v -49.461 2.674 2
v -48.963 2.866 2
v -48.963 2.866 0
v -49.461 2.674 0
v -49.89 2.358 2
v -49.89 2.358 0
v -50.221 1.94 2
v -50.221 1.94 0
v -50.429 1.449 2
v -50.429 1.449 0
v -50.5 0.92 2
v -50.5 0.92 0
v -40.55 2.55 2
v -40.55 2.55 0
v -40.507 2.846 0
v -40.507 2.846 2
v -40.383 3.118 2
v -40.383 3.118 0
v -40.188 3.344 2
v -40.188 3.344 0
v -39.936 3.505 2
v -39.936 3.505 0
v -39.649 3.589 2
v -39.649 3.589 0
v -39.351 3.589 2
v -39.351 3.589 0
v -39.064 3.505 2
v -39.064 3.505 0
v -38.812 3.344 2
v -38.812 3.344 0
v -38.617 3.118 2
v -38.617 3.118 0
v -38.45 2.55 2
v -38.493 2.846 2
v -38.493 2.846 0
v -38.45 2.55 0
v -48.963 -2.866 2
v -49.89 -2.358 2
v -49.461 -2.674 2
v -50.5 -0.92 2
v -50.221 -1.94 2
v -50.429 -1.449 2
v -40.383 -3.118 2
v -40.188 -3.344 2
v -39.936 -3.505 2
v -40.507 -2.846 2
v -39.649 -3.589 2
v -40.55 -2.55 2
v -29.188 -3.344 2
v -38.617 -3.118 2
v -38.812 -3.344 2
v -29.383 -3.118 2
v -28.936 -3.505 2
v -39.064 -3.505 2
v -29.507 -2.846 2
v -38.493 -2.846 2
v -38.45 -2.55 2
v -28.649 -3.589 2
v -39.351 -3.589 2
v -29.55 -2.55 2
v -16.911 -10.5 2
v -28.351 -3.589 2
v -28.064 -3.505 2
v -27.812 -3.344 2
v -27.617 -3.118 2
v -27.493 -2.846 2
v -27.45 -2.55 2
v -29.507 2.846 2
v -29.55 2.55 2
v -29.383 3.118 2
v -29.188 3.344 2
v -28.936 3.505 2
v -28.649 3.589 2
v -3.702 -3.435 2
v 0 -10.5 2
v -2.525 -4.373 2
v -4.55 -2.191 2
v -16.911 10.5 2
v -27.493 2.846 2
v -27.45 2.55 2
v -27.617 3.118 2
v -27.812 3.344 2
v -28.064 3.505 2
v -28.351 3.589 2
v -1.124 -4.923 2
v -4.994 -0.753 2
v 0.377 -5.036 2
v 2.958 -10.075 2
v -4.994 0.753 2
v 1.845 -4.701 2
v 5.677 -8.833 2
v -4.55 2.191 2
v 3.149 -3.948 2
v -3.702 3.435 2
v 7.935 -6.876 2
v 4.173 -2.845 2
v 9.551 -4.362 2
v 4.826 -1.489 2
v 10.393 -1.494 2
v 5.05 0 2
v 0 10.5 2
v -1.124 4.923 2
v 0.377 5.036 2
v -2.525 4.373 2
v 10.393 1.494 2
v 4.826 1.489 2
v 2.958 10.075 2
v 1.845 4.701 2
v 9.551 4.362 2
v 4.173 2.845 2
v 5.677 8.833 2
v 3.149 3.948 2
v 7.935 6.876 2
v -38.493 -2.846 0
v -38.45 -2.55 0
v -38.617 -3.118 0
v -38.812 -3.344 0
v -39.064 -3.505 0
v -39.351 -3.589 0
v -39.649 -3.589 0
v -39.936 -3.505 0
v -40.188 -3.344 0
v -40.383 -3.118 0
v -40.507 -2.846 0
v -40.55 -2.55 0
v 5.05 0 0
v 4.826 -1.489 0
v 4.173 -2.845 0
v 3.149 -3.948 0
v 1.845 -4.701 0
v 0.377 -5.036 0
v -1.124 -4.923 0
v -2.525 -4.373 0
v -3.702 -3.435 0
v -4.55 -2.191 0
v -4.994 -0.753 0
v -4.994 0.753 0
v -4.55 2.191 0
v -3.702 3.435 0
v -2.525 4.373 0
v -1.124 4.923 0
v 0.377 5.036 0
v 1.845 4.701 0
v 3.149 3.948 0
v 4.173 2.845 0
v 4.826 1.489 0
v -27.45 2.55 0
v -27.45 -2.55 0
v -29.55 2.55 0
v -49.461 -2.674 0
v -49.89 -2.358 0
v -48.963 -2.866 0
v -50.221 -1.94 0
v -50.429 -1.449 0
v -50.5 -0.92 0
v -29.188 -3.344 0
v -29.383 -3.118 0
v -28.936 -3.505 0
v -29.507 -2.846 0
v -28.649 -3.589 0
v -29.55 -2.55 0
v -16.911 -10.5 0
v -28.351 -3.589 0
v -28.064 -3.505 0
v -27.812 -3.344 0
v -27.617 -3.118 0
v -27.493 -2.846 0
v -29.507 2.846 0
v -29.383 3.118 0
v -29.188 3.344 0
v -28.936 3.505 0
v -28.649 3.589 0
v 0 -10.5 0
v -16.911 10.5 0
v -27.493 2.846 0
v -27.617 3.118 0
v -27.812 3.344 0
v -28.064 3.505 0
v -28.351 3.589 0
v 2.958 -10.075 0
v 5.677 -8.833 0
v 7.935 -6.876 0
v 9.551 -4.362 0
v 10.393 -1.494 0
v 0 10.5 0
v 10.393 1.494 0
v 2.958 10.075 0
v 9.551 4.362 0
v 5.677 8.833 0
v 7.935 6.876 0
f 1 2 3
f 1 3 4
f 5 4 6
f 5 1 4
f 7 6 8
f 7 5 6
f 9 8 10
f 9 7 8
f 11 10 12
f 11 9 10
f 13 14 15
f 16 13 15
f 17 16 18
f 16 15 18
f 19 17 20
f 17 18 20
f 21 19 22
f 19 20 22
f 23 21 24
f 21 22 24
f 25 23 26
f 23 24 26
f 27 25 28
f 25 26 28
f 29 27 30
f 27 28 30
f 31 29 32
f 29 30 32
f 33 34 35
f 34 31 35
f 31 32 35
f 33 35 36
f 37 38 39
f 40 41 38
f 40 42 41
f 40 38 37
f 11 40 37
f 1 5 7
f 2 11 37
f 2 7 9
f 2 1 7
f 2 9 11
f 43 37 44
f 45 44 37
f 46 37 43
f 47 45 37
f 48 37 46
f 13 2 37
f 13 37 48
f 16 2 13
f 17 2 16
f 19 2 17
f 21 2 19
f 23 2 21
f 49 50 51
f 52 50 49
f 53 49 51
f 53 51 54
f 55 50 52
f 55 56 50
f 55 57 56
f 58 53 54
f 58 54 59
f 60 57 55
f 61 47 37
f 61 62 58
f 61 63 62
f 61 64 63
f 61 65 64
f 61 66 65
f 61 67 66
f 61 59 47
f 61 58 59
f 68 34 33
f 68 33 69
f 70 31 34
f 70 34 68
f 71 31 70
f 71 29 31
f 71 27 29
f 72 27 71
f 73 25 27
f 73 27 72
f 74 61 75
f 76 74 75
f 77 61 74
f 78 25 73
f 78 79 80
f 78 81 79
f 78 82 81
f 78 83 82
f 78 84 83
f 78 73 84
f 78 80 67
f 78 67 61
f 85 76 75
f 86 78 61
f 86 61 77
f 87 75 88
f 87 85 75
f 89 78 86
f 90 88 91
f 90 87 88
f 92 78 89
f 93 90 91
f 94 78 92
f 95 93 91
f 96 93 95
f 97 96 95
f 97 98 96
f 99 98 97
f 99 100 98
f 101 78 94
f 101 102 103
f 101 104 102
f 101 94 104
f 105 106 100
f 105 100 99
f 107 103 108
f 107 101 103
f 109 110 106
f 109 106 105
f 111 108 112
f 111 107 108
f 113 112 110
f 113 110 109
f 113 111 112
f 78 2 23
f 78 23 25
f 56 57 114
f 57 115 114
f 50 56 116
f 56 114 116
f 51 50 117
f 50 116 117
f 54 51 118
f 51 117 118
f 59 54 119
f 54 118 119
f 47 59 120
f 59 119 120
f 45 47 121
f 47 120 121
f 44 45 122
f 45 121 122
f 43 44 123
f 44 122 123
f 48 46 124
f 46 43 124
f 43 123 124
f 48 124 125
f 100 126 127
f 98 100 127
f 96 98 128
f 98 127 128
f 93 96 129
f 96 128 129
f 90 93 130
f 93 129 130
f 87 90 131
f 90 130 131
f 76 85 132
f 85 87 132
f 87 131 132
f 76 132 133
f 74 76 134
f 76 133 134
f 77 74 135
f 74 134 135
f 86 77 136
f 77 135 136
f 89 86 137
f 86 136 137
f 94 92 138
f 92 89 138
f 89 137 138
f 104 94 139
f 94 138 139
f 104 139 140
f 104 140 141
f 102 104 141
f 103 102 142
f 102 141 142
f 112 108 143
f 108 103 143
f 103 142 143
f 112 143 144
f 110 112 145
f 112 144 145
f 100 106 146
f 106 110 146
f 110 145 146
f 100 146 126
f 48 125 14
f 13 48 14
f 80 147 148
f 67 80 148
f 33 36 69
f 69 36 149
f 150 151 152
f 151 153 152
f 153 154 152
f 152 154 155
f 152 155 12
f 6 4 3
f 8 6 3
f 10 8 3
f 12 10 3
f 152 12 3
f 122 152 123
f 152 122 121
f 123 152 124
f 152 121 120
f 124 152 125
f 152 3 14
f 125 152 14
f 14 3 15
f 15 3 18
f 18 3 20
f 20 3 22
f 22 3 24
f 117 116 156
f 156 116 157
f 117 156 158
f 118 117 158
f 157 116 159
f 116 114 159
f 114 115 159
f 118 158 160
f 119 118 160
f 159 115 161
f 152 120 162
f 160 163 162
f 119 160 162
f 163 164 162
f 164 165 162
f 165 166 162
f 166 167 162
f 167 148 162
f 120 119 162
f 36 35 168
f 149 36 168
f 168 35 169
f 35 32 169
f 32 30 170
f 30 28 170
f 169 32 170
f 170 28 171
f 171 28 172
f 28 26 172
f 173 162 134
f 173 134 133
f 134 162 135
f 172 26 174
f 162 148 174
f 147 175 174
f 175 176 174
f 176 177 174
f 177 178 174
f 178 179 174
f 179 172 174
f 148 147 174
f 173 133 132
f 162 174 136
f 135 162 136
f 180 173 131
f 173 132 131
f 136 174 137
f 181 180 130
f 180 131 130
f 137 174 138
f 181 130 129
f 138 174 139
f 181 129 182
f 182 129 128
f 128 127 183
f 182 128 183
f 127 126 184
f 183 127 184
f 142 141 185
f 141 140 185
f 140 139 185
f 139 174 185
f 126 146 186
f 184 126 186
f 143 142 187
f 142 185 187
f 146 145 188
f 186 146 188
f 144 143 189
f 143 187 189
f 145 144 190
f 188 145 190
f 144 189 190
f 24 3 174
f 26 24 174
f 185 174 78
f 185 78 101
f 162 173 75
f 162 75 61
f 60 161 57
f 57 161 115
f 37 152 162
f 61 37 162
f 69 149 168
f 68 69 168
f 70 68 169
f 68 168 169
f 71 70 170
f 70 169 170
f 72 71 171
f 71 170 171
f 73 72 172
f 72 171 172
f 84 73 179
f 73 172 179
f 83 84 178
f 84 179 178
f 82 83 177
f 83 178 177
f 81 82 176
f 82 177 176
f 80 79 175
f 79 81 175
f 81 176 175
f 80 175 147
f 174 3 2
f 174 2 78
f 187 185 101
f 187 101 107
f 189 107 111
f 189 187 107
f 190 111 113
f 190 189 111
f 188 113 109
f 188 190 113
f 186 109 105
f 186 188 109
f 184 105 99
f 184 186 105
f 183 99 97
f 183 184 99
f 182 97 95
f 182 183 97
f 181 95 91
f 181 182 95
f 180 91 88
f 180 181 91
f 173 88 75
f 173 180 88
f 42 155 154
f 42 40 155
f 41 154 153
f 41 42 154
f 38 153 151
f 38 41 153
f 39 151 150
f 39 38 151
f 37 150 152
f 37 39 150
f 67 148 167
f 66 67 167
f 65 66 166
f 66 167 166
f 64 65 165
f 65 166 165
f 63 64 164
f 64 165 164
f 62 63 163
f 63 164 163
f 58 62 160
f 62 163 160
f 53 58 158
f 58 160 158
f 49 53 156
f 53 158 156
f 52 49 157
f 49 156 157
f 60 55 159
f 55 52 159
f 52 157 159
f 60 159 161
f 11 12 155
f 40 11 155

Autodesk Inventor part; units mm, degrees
ref_plane "YZ Plane" through (0, 0, 0) normal (1, 0, 0) x (0, 1, 0)
ref_plane "XZ Plane" through (0, 0, 0) normal (0, 1, 0) x (-1, 0, 0)
ref_plane "XY Plane" through (0, 0, 0) normal (0, 0, 1) x (1, 0, 0)
sketch "スケッチ1" plane through (0, 0, 0) normal (0, 0, 1) x (1, 0, 0)
  circle A0 centre (0, 0) radius 10.5 construction
  line L0 (0, 10.5) -> (-162.5, 10.5) construction
  line L1 (-162.5, 10.5) -> (-162.5, -10.5) construction
  line L2 (-162.5, -10.5) -> (0, -10.5) construction
  circle A1 centre (-157.5, 0) radius 1.55 construction
  line L3 (-147.5, 2.5) -> (-32.5, 2.5) construction
  line L4 (-32.5, 2.5) -> (-32.5, -2.5) construction
  line L5 (-32.5, -2.5) -> (-147.5, -2.5) construction
  line L6 (-147.5, -2.5) -> (-147.5, 2.5) construction
  line L7 (-90, 2.5) -> (-90, -2.5) construction
  circle A2 centre (-22.5, 0) radius 1.55 construction
  line L8 (-12, 21.3027) -> (-12, -27.3903) construction
  line L9 (-32.45, 2.55) -> (-147.55, 2.55) construction
  line L10 (-147.55, 2.55) -> (-147.55, -2.55) construction
  line L11 (-147.55, -2.55) -> (-32.45, -2.55) construction
  line L12 (-32.45, -2.55) -> (-32.45, 2.55) construction
  circle A3 centre (-146.5, 2.55) radius 1.05 construction
  line L13 (-147.5, 0) -> (-90, 0) construction
  line L14 (-147.55, 2.55) -> (-147.55, -2.55) construction
  arc A4 (-145.45, 2.55) -> (-147.55, 2.55) centre (-146.5, 2.55) ccw construction
  line L15 (-145.45, 2.55) -> (-34.55, 2.55) construction
  arc A5 (-32.45, 2.55) -> (-34.55, 2.55) centre (-33.5, 2.55) ccw construction
  line L16 (-32.45, 2.55) -> (-32.45, -2.55) construction
  arc A6 (-147.55, -2.55) -> (-145.45, -2.55) centre (-146.5, -2.55) ccw construction
  line L17 (-145.45, -2.55) -> (-34.55, -2.55) construction
  arc A7 (-34.55, -2.55) -> (-32.45, -2.55) centre (-33.5, -2.55) ccw construction
  circle A8 centre (0, 8.5) radius 1.35
  circle A9 centre (0, 0) radius 5.05
  circle A10 centre (-8.5, 0) radius 1.35
  circle A11 centre (0, -8.5) radius 1.35
  circle A12 centre (8.5, 0) radius 1.35
  line L18 (-162.5, 4.8006) -> (-162.5, -4.8006) construction
  line L19 (-162.5, 4.8006) -> (-22.5, 10.5) construction
  line L20 (-22.5, 10.5) -> (0, 10.5) construction
  line L21 (-162.5, -4.8006) -> (-22.5, -10.5) construction
  line L22 (-22.5, -10.5) -> (0, -10.5) construction
  arc A13 (0, -10.5) -> (0, 10.5) centre (0, 0) ccw construction
  circle A14 centre (-157.5, 0) radius 5 construction
  circle A15 centre (-21.5, 0) radius 1.55
  circle A16 centre (-46.5, 0) radius 1.55
  line L23 (-17.5, -2.5) -> (-50.5, -2.5) construction
  line L24 (-50.5, -2.5) -> (-50.5, 2.5) construction
  line L25 (-50.5, 2.5) -> (-17.5, 2.5) construction
  line L26 (-17.5, 2.5) -> (-17.5, -2.5) construction
  line L27 (-27.5, -2.5) -> (-40.5, -2.5) construction
  line L28 (-40.5, -2.5) -> (-40.5, 2.5) construction
  line L29 (-40.5, 2.5) -> (-27.5, 2.5) construction
  line L30 (-27.5, 2.5) -> (-27.5, -2.5) construction
  line L31 (-27.45, -2.55) -> (-40.55, -2.55)
  line L32 (-40.55, -2.55) -> (-40.55, 2.55)
  line L33 (-40.55, 2.55) -> (-27.45, 2.55)
  line L34 (-27.45, 2.55) -> (-27.45, -2.55)
  circle A17 centre (-28.5, -2.55) radius 1.05
  circle A18 centre (-28.5, 2.55) radius 1.05
  circle A19 centre (-39.5, -2.55) radius 1.05
  circle A20 centre (-39.5, 2.55) radius 1.05
  line L35 (-50.5, 2.5) -> (-50.5, -2.5)
  line L36 (-50.5, -2.5) -> (-16.9113, -10.5)
  line L37 (-50.5, 2.5) -> (-16.9113, 10.5)
  arc A21 (0, -10.5) -> (0, 10.5) centre (0, 0) ccw
  line L38 (-16.9113, 10.5) -> (0, 10.5)
  line L39 (0, -10.5) -> (-16.9113, -10.5)
  circle A22 centre (-39.5, 2.55) radius 2.5 construction
  circle A23 centre (0, 0) radius 16 construction
  circle A24 centre (0, 0) radius 21 construction
  line L40 (-21, 19.3585) -> (-21, -28.09) construction
  point P0 (-162.5, 0)
  point P1 (-17.5, 0)
  dimension "d9" = 2.1
  dimension "d29" = 2.1
  dimension "d0" = 162.5
  dimension "d1" = 3.1
  dimension "d2" = 21
  dimension "d3" = 10
  dimension "d4" = 5
  dimension "d5" = 12
  dimension "d6" = 135
  dimension "d7" = 5
  dimension "d8" = 0.05
  dimension "d10" = 2.7
  dimension "d11" = 8.5
  dimension "d12" = 10.1
  dimension "d15" = 360
  dimension "d20" = 3.1
  dimension "d21" = 5
  dimension "d22" = 4
  dimension "d23" = 5
  dimension "d24" = 25
  dimension "d26" = 10
  dimension "d27" = 4
  dimension "d28" = 10
  dimension "d30" = 0.05
  dimension "d32" = 5
  dimension "d33" = 32
  dimension "d34" = 5
extrude "押し出し1" add sketch "スケッチ1" along normal blind 2
fillet "フィレット2" radius 2 2 edges at (-50.5, 2.5, 1) (-50.5, -2.5, 1)
sketch "スケッチ2" plane through (0, 0, 0) normal (0, 0, -1) x (-1, 0, 0)
  circle A0 centre (0, -8.5) radius 1.35 projected
  circle A1 centre (0, -8.5) radius 1.35
  circle A2 centre (8.5, 0) radius 1.35 projected
  circle A3 centre (8.5, 0) radius 1.35
  circle A4 centre (0, 8.5) radius 1.35 projected
  circle A5 centre (0, 8.5) radius 1.35
  circle A6 centre (-8.5, 0) radius 1.35 projected
  circle A7 centre (-8.5, 0) radius 1.35
  circle A8 centre (21.5, 0) radius 1.55 projected
  circle A9 centre (21.5, 0) radius 1.55
  circle A10 centre (46.5, 0) radius 1.55 projected
  circle A11 centre (46.5, 0) radius 1.55
  point P0 (0, 0)
extrude "押し出し2" add sketch "スケッチ2" against normal up to surface (2 mm away)
equation "\"d0\" = d0_1"
equation "\"d2\" = d2_1"
equation "\"d3\" = d3_1"
equation "\"d4\" = d4_1"
equation "\"d6\" = d6_1"
equation "\"d21\" = d4"
equation "\"d27\" = d22"
equation "\"d28\" = d26"
equation "\"d2_1\" = 21"
equation "\"d3_1\" = 10"
equation "\"d4_1\" = 5"
equation "\"d6_1\" = 135"
equation "\"d0_1\" = 162.5"
properties part number "前腕_メインフレーム_1_1" material "GFRP"
